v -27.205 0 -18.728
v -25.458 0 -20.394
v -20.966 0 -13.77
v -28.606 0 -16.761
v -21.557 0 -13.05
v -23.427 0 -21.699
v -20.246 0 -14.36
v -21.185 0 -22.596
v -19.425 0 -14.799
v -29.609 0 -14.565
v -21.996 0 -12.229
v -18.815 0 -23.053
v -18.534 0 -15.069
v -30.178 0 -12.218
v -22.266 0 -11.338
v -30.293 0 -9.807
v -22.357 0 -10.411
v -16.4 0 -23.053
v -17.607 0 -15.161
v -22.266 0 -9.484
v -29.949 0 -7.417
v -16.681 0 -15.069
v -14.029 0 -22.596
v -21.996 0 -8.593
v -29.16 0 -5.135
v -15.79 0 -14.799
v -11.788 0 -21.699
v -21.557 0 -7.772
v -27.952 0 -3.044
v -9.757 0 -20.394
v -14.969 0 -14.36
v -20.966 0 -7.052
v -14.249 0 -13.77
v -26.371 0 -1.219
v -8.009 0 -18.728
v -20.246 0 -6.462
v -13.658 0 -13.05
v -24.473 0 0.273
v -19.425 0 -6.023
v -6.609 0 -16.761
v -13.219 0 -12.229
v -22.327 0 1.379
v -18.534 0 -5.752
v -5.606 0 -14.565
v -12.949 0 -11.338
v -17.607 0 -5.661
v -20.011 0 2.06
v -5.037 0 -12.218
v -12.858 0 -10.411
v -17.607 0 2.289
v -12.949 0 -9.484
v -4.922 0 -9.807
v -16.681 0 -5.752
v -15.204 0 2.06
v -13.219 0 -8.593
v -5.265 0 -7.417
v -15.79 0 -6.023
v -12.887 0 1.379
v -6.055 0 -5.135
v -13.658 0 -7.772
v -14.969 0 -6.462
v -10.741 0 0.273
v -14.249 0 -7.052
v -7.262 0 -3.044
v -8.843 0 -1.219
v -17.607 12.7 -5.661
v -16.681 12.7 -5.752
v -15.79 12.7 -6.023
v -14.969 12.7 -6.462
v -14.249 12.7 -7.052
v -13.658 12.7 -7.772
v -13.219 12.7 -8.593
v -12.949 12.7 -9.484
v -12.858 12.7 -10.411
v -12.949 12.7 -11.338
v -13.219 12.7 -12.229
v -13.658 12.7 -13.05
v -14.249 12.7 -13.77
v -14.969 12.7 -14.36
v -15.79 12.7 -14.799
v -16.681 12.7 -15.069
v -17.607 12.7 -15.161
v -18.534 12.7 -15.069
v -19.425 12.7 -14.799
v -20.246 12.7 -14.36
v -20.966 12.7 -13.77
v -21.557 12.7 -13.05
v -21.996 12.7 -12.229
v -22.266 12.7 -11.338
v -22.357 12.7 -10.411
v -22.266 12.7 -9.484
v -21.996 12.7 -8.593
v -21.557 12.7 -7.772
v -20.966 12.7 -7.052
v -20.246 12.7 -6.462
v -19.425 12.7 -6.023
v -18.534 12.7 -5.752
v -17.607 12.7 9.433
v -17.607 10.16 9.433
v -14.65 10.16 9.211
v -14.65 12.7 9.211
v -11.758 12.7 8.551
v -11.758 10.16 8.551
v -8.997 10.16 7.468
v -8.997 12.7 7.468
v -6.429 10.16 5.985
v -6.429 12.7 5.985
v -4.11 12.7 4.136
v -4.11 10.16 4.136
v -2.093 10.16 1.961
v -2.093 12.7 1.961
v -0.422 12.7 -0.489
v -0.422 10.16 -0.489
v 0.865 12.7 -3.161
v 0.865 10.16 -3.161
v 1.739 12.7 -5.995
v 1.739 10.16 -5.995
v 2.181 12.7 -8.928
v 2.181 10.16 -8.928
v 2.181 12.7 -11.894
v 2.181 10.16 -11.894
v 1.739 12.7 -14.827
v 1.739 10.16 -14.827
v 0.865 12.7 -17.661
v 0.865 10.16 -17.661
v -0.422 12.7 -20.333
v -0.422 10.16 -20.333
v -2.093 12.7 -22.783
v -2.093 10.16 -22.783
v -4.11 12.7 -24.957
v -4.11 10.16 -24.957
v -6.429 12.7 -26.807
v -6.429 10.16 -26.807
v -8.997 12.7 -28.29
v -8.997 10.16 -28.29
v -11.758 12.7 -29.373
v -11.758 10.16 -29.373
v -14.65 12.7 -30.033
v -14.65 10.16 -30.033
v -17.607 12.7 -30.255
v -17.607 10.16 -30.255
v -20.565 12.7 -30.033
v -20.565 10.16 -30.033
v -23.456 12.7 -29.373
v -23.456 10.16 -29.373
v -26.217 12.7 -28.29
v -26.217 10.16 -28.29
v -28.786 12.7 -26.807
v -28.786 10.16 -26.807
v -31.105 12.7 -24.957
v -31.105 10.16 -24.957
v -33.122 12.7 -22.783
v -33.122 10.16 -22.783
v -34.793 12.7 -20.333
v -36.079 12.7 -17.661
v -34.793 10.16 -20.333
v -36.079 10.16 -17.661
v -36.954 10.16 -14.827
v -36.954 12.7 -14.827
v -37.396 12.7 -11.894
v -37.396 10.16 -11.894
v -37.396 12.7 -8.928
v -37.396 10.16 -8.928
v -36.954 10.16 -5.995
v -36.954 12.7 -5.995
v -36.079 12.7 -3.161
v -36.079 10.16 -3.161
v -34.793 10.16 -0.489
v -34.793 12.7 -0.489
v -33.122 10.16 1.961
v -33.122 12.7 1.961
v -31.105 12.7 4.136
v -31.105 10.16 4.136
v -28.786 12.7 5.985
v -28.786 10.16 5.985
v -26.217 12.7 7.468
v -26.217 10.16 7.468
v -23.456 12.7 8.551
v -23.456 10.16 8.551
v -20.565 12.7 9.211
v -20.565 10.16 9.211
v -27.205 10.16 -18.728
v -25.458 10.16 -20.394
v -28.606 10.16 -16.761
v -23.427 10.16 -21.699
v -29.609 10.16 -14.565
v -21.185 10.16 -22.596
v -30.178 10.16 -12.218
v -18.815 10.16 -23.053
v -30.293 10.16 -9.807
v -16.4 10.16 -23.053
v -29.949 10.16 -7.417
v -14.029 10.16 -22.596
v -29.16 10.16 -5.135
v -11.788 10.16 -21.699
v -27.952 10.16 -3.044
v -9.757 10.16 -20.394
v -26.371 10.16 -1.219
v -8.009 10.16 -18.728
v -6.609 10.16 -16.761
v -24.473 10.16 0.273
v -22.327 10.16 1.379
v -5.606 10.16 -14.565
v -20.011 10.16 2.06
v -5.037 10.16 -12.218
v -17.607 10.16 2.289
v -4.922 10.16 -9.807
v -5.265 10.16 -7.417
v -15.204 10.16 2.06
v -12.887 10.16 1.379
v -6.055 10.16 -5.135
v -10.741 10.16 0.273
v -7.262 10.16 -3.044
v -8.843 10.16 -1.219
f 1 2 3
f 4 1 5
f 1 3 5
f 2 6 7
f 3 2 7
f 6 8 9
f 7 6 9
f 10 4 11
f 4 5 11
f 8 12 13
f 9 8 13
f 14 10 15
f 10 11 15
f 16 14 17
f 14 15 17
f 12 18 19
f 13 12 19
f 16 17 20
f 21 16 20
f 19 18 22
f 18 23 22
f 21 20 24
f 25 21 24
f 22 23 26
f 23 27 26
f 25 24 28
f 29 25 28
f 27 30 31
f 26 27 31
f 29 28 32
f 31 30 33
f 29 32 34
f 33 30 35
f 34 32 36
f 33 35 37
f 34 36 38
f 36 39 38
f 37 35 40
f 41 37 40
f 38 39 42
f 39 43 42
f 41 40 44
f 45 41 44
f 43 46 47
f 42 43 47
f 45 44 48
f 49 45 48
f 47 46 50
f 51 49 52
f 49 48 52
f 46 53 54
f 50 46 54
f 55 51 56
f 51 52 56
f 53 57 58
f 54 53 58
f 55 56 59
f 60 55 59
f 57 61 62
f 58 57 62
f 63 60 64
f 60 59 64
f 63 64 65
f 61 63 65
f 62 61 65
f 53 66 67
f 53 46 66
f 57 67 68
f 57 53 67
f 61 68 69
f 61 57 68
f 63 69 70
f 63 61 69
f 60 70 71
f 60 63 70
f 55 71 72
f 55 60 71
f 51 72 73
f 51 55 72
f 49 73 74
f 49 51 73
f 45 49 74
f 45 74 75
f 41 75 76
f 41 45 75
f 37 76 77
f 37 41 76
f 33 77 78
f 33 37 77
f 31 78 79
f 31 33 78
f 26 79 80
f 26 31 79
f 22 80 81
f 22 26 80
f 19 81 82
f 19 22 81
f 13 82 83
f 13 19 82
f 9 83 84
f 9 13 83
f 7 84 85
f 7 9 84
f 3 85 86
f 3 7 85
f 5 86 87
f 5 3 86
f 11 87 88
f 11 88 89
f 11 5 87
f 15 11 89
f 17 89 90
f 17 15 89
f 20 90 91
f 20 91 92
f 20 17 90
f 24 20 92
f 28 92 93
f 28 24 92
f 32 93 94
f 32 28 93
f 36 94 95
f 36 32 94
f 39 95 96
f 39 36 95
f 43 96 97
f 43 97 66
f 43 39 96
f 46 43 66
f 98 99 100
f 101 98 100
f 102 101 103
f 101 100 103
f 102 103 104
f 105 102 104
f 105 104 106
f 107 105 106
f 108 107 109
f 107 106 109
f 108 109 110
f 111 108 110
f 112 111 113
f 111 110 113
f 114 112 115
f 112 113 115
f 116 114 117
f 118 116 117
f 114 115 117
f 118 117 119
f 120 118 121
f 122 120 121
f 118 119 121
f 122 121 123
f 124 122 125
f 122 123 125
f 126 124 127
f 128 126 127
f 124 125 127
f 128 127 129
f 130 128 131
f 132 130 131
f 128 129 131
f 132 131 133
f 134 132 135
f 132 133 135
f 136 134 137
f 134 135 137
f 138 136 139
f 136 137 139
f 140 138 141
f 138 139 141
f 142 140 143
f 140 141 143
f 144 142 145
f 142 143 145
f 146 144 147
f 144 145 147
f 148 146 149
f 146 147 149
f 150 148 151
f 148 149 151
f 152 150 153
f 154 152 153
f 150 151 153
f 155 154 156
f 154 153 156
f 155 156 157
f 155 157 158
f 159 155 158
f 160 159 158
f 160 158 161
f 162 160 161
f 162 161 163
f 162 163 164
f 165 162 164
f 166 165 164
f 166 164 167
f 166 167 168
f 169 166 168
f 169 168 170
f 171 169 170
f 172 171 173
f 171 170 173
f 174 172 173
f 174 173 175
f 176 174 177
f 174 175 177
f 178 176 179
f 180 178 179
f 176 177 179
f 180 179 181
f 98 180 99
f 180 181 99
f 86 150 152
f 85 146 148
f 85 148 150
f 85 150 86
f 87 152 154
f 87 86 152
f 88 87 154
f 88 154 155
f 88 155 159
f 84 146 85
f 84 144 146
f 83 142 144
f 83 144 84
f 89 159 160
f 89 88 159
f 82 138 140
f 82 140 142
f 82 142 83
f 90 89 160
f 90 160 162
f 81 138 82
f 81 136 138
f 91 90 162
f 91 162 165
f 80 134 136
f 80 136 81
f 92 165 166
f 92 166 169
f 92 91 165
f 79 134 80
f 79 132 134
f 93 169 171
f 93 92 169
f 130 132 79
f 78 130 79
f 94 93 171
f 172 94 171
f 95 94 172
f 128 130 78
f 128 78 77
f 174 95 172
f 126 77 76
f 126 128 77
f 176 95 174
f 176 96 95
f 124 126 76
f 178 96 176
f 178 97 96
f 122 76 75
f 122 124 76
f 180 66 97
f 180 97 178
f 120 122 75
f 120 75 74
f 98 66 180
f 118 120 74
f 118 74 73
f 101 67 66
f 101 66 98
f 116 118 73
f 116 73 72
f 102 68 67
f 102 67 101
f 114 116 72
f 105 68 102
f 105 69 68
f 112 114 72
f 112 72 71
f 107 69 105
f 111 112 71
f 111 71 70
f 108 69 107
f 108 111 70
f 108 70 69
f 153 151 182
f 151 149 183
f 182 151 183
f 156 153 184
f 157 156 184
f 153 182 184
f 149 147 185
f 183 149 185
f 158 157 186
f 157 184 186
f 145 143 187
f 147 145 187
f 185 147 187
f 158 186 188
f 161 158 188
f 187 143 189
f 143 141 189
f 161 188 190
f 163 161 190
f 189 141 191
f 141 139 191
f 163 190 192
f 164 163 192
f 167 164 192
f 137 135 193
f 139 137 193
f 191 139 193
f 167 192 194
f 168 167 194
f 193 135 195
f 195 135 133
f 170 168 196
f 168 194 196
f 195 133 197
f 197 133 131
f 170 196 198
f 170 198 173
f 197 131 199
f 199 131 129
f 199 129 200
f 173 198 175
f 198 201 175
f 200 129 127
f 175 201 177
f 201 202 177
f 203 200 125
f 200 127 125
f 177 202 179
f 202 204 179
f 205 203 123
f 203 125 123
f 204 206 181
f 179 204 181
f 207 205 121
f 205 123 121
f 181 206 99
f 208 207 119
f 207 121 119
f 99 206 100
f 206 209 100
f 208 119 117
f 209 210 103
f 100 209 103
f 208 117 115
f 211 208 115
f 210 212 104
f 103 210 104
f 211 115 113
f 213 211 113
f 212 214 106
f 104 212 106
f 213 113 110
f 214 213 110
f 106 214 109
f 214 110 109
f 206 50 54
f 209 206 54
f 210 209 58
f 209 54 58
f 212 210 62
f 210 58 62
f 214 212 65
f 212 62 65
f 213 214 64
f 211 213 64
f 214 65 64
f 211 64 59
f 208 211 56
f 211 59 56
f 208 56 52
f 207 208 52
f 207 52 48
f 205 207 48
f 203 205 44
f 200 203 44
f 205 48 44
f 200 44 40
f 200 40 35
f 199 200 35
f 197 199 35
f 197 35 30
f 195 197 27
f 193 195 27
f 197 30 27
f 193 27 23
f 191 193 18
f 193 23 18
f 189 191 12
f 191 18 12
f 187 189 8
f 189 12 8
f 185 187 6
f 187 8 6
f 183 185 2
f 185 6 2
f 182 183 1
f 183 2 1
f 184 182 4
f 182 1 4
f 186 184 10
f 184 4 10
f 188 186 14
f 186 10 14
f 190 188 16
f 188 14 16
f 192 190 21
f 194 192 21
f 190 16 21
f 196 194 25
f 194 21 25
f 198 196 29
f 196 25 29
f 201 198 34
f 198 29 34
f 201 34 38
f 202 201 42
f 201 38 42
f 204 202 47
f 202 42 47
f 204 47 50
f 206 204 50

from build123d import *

# Parameters (mm, degrees)
SKETCH1_R           = 12.7
BOSS_EXTRUDE1_DEPTH = 10.16
SKETCH2_R           = 19.84375
SKETCH2_R_2         = 4.7498
BOSS_EXTRUDE2_DEPTH = 2.54
CUT_EXTRUDE1_START  = -12.7
SKETCH3_R           = 4.7498
CUT_EXTRUDE1_DEPTH  = 12.7


with BuildPart() as part:
    # Sketch1 → Boss-Extrude1 (new body)
    with BuildSketch(Plane(origin=(0, 0, 0), x_dir=(1, 0, 0), z_dir=(0, 1, 0))):
        with Locations(Location((-17.607350735, 10.410900498, 0), (0, 0, 270))):
            Circle(SKETCH1_R)
    extrude(amount=BOSS_EXTRUDE1_DEPTH)

    # Sketch2 → Boss-Extrude2 (add)
    with BuildSketch(Plane(origin=(0, 10.16, 0), x_dir=(1, 0, 0), z_dir=(0, 1, 0))):
        with Locations(Location((-17.607350735, 10.410900498, 0), (0, 0, 270))):
            Circle(SKETCH2_R)
        with Locations(Location((-17.607350735, 10.410900498, 0), (0, 0, 270))):
            Circle(SKETCH2_R_2, mode=Mode.SUBTRACT)
    extrude(amount=BOSS_EXTRUDE2_DEPTH)

    # Sketch3 → Cut-Extrude1 (cut)
    with BuildSketch(Plane(origin=(0, 10.16, 0), x_dir=(1, 0, 0), z_dir=(0, 1, 0)).offset(CUT_EXTRUDE1_START)):
        with Locations(Location((-17.607350735, 10.410900498, 0), (0, 0, 270))):
            Circle(SKETCH3_R)
    extrude(amount=CUT_EXTRUDE1_DEPTH, mode=Mode.SUBTRACT)


solid = part.part
